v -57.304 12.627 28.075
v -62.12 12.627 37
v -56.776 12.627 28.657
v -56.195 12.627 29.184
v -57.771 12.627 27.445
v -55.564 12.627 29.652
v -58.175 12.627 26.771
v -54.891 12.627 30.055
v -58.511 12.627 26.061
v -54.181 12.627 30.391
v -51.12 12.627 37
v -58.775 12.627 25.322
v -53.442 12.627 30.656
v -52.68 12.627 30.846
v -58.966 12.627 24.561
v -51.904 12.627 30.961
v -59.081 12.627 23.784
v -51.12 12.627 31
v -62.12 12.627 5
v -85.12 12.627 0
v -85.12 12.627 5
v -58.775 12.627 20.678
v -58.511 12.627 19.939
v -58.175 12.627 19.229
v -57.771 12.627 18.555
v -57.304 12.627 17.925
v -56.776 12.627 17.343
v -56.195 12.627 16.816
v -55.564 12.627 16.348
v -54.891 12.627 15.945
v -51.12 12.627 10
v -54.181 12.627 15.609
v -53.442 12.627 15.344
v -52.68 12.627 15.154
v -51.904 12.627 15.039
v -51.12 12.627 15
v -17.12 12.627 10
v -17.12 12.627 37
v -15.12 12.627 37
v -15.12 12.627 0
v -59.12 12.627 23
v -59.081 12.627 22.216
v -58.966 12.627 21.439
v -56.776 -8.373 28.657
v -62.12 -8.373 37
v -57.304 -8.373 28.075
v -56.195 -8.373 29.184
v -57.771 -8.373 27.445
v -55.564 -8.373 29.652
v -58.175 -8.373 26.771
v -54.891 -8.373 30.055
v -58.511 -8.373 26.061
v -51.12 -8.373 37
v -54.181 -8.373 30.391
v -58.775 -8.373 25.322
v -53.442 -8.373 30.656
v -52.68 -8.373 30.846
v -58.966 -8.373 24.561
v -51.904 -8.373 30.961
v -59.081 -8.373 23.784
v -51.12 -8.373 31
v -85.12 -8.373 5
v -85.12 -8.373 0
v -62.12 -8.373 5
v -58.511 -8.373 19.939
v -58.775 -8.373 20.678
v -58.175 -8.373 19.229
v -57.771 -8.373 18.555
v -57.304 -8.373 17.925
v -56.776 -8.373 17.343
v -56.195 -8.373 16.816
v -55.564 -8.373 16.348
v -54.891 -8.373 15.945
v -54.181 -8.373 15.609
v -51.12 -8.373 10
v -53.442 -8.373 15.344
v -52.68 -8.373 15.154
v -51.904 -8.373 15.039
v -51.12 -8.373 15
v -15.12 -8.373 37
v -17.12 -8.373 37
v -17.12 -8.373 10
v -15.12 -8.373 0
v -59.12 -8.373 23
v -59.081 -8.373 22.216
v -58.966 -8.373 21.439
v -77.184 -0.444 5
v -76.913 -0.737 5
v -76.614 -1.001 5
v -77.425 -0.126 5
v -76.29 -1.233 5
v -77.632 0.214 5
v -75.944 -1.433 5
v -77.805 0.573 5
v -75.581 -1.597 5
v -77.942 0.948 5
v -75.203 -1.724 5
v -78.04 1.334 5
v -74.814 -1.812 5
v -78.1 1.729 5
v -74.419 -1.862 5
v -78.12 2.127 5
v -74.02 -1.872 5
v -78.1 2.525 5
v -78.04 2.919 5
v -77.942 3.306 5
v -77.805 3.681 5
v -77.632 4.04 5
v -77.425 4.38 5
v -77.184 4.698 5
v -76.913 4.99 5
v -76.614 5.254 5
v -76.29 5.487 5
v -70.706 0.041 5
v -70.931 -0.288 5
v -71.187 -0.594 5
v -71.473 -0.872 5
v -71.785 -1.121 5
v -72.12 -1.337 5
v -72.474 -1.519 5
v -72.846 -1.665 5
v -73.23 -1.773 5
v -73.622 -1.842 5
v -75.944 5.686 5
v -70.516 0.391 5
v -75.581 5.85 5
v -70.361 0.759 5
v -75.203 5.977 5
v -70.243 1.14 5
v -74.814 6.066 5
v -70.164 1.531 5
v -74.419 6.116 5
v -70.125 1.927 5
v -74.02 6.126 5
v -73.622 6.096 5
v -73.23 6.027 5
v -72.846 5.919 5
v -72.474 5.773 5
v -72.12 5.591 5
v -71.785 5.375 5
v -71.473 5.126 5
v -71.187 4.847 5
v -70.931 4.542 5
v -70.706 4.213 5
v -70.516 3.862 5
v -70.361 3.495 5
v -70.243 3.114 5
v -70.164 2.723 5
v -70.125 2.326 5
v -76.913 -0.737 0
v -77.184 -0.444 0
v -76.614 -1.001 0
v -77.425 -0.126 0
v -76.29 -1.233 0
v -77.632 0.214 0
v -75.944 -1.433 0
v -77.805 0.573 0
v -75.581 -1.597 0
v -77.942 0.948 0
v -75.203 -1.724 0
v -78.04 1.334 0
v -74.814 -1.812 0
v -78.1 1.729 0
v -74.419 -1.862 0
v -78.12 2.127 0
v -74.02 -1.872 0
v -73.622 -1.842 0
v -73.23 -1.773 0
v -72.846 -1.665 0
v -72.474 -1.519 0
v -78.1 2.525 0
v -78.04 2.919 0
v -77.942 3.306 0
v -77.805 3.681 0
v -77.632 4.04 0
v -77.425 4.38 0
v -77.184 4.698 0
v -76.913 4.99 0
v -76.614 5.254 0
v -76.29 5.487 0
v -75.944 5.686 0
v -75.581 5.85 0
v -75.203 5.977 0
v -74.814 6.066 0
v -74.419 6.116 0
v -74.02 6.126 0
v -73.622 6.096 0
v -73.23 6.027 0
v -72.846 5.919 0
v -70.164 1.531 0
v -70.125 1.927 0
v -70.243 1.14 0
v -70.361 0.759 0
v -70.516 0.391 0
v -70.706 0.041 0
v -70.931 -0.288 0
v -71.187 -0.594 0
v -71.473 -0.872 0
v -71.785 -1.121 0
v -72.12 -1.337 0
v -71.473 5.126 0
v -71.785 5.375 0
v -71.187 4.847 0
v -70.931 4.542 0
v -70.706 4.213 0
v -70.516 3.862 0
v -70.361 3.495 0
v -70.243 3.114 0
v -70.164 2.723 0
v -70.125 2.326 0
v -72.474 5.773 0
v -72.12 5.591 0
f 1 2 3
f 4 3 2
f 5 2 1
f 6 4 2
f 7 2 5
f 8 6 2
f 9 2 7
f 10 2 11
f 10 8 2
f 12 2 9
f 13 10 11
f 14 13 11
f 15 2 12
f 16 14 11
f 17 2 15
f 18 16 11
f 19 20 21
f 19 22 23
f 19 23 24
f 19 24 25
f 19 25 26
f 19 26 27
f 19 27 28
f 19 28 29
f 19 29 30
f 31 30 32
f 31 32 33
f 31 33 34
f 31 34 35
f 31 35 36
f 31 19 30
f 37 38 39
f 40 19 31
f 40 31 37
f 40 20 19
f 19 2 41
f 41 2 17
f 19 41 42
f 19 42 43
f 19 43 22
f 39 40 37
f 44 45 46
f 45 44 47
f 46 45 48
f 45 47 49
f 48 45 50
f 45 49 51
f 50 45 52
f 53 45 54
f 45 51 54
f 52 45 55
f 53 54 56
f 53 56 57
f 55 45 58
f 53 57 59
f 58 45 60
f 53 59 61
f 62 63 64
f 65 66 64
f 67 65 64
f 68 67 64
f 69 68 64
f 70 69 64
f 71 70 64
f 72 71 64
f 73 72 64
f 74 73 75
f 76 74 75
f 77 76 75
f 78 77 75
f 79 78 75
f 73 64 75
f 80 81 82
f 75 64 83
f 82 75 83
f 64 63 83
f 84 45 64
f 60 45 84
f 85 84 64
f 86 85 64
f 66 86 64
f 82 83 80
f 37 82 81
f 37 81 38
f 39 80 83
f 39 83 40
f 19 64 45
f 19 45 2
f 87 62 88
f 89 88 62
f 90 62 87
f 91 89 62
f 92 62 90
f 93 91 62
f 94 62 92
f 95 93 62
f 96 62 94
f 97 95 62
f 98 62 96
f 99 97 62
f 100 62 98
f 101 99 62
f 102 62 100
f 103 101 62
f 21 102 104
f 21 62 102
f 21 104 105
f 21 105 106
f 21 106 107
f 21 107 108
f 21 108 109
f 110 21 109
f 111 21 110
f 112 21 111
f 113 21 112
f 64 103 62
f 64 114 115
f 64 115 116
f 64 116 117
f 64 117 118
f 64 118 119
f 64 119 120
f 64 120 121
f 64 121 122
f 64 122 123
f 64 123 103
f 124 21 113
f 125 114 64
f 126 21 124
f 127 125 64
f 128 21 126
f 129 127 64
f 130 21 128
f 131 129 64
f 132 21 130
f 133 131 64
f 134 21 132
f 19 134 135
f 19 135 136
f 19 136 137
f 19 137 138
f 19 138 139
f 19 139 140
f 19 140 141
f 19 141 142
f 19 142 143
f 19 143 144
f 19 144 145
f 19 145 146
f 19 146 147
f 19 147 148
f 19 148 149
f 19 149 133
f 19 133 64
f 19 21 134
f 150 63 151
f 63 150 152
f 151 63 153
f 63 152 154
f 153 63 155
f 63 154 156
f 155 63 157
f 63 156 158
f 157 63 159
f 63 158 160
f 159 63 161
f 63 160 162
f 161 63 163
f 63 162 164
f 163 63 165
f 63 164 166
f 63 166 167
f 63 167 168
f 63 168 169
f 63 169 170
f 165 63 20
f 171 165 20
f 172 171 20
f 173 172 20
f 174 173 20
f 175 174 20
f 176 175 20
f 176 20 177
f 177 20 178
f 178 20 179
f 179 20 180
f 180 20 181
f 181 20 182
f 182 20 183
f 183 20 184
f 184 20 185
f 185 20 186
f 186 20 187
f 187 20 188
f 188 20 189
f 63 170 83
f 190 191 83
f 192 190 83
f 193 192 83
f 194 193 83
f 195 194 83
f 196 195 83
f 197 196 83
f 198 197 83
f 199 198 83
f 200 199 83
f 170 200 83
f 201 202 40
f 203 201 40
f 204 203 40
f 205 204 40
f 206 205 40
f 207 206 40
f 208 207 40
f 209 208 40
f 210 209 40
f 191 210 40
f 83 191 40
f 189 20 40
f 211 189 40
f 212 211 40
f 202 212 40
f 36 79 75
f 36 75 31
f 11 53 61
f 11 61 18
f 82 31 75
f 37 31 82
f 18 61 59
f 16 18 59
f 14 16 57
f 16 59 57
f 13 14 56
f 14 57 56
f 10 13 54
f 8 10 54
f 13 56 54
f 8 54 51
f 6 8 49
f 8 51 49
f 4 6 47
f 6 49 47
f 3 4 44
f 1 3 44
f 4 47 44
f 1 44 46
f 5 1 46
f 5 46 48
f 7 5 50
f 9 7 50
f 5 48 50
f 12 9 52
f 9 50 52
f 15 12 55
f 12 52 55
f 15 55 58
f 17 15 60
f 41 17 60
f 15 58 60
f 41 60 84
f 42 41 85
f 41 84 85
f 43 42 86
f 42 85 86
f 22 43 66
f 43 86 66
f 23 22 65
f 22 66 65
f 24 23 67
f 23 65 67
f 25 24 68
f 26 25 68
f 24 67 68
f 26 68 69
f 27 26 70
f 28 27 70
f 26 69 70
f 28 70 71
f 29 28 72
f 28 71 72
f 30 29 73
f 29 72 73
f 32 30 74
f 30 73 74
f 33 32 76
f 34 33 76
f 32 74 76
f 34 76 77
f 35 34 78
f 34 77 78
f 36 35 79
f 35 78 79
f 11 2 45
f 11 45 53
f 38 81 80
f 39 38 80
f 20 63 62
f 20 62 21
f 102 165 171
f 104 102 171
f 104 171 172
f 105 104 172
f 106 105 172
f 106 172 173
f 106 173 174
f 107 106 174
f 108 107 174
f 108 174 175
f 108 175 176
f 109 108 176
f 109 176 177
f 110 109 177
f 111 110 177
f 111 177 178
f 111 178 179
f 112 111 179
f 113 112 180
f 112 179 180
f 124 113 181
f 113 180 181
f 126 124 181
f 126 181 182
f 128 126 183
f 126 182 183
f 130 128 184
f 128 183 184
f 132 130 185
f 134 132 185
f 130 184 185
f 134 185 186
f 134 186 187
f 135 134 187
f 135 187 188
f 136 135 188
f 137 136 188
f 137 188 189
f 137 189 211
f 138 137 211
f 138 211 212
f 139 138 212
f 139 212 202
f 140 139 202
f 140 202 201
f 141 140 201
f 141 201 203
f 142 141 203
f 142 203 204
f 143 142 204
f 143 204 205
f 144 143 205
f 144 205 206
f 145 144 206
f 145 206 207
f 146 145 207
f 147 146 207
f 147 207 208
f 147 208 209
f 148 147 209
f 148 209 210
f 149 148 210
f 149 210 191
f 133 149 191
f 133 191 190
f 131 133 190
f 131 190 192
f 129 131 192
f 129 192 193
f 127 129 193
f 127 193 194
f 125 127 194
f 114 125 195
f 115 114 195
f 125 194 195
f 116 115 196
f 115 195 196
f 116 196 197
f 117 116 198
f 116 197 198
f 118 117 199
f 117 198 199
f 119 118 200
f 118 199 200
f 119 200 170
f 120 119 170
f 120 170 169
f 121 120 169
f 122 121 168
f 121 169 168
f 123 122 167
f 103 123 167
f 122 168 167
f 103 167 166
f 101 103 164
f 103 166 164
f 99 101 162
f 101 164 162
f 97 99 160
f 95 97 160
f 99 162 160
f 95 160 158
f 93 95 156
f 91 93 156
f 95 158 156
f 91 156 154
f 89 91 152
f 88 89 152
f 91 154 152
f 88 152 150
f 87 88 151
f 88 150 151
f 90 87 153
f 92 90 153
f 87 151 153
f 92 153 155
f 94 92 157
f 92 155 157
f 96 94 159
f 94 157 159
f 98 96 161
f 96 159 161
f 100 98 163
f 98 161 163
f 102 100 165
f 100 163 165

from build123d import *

# Parameters (mm, degrees)
F0_W     = 70
F0_H     = 21
F1_DEPTH = 37
F2_W     = 34
F2_H     = 21
F3_DEPTH = 27
F5_DEPTH = 21
F6_W     = 23
F6_H     = 21
F7_DEPTH = 32
F9_D     = 8


with BuildPart() as f1:
    # F0 (on Top) → F1 (new body)
    with BuildSketch(Plane.XY):
        with Locations((-50.1195863448, 2.1268057005)):
            Rectangle(F0_W, F0_H)
    extrude(amount=F1_DEPTH)

    # F2 (on face) → F3 (cut)
    with BuildSketch(Plane.XY.offset(37)):
        with Locations((-34.1195863448, 2.1268057005)):
            Rectangle(F2_W, F2_H)
    extrude(amount=-F3_DEPTH, mode=Mode.SUBTRACT)

    # F4 (on face) → F5 (cut)
    with BuildSketch(Plane.XZ.offset(8.3731942995)):
        with BuildLine():
            Line((-51.1195863448, 15), (-51.1195863448, 31))
            ThreePointArc((-51.1195863448, 31), (-59.1195863448, 23), (-51.1195863448, 15))
        make_face()
    extrude(amount=-F5_DEPTH, mode=Mode.SUBTRACT)

    # F6 (on face) → F7 (cut)
    with BuildSketch(Plane.XY.offset(37)):
        with Locations((-73.6195863448, 2.1268057005)):
            Rectangle(F6_W, F6_H)
    extrude(amount=-F7_DEPTH, mode=Mode.SUBTRACT)

    # F9 (through all)
    with Locations(Plane.XY.offset(5)):
        with Locations((-74.1195863448, 2.1268057005)):
            Hole(F9_D / 2)


solid = f1.part
